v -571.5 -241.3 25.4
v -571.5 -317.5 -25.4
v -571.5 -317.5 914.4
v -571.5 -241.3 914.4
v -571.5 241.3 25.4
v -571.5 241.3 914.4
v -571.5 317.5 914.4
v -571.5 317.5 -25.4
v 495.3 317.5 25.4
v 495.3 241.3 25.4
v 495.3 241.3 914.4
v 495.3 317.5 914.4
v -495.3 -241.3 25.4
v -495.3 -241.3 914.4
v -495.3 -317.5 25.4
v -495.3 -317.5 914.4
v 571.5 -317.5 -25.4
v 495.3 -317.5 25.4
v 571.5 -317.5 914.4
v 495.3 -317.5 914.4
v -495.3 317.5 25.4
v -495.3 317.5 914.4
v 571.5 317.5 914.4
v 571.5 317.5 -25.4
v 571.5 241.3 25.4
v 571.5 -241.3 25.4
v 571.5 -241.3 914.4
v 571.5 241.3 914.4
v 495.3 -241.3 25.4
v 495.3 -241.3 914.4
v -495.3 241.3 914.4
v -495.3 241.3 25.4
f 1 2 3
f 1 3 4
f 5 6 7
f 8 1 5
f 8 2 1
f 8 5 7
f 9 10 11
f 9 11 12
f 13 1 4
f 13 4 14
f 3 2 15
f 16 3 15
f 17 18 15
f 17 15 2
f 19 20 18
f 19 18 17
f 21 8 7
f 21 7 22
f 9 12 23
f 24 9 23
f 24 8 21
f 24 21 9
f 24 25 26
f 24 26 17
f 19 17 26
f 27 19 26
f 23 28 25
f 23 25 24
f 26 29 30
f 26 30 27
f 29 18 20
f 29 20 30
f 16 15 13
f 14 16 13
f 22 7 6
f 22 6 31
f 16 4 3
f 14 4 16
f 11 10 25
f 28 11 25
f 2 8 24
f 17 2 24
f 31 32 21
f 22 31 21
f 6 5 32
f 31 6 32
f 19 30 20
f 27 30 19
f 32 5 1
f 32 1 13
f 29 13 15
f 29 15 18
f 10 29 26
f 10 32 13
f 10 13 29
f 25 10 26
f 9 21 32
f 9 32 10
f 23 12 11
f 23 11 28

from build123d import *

# Parameters (mm, degrees)
F0_W     = 1143
F0_H     = 635
F1_DEPTH = 25.4
F2_W     = 76.2
F2_H     = 76.2
F3_DEPTH = 889


with BuildPart() as f1:
    # F0 (on Top) → F1 (new body, symmetric)
    with BuildSketch(Plane.XY):
        Rectangle(F0_W, F0_H)
    extrude(amount=F1_DEPTH, both=True)

    # F2 (on face) → F3 (join)
    with BuildSketch(Plane.XY.offset(25.4)):
        with Locations((-533.4, 279.4)):
            Rectangle(F2_W, F2_H)
        with Locations((-533.4, -279.4)):
            Rectangle(F2_W, F2_H)
        with Locations((533.4, 279.4)):
            Rectangle(F2_W, F2_H)
        with Locations((533.4, -279.4)):
            Rectangle(F2_W, F2_H)
    extrude(amount=F3_DEPTH)


solid = f1.part
